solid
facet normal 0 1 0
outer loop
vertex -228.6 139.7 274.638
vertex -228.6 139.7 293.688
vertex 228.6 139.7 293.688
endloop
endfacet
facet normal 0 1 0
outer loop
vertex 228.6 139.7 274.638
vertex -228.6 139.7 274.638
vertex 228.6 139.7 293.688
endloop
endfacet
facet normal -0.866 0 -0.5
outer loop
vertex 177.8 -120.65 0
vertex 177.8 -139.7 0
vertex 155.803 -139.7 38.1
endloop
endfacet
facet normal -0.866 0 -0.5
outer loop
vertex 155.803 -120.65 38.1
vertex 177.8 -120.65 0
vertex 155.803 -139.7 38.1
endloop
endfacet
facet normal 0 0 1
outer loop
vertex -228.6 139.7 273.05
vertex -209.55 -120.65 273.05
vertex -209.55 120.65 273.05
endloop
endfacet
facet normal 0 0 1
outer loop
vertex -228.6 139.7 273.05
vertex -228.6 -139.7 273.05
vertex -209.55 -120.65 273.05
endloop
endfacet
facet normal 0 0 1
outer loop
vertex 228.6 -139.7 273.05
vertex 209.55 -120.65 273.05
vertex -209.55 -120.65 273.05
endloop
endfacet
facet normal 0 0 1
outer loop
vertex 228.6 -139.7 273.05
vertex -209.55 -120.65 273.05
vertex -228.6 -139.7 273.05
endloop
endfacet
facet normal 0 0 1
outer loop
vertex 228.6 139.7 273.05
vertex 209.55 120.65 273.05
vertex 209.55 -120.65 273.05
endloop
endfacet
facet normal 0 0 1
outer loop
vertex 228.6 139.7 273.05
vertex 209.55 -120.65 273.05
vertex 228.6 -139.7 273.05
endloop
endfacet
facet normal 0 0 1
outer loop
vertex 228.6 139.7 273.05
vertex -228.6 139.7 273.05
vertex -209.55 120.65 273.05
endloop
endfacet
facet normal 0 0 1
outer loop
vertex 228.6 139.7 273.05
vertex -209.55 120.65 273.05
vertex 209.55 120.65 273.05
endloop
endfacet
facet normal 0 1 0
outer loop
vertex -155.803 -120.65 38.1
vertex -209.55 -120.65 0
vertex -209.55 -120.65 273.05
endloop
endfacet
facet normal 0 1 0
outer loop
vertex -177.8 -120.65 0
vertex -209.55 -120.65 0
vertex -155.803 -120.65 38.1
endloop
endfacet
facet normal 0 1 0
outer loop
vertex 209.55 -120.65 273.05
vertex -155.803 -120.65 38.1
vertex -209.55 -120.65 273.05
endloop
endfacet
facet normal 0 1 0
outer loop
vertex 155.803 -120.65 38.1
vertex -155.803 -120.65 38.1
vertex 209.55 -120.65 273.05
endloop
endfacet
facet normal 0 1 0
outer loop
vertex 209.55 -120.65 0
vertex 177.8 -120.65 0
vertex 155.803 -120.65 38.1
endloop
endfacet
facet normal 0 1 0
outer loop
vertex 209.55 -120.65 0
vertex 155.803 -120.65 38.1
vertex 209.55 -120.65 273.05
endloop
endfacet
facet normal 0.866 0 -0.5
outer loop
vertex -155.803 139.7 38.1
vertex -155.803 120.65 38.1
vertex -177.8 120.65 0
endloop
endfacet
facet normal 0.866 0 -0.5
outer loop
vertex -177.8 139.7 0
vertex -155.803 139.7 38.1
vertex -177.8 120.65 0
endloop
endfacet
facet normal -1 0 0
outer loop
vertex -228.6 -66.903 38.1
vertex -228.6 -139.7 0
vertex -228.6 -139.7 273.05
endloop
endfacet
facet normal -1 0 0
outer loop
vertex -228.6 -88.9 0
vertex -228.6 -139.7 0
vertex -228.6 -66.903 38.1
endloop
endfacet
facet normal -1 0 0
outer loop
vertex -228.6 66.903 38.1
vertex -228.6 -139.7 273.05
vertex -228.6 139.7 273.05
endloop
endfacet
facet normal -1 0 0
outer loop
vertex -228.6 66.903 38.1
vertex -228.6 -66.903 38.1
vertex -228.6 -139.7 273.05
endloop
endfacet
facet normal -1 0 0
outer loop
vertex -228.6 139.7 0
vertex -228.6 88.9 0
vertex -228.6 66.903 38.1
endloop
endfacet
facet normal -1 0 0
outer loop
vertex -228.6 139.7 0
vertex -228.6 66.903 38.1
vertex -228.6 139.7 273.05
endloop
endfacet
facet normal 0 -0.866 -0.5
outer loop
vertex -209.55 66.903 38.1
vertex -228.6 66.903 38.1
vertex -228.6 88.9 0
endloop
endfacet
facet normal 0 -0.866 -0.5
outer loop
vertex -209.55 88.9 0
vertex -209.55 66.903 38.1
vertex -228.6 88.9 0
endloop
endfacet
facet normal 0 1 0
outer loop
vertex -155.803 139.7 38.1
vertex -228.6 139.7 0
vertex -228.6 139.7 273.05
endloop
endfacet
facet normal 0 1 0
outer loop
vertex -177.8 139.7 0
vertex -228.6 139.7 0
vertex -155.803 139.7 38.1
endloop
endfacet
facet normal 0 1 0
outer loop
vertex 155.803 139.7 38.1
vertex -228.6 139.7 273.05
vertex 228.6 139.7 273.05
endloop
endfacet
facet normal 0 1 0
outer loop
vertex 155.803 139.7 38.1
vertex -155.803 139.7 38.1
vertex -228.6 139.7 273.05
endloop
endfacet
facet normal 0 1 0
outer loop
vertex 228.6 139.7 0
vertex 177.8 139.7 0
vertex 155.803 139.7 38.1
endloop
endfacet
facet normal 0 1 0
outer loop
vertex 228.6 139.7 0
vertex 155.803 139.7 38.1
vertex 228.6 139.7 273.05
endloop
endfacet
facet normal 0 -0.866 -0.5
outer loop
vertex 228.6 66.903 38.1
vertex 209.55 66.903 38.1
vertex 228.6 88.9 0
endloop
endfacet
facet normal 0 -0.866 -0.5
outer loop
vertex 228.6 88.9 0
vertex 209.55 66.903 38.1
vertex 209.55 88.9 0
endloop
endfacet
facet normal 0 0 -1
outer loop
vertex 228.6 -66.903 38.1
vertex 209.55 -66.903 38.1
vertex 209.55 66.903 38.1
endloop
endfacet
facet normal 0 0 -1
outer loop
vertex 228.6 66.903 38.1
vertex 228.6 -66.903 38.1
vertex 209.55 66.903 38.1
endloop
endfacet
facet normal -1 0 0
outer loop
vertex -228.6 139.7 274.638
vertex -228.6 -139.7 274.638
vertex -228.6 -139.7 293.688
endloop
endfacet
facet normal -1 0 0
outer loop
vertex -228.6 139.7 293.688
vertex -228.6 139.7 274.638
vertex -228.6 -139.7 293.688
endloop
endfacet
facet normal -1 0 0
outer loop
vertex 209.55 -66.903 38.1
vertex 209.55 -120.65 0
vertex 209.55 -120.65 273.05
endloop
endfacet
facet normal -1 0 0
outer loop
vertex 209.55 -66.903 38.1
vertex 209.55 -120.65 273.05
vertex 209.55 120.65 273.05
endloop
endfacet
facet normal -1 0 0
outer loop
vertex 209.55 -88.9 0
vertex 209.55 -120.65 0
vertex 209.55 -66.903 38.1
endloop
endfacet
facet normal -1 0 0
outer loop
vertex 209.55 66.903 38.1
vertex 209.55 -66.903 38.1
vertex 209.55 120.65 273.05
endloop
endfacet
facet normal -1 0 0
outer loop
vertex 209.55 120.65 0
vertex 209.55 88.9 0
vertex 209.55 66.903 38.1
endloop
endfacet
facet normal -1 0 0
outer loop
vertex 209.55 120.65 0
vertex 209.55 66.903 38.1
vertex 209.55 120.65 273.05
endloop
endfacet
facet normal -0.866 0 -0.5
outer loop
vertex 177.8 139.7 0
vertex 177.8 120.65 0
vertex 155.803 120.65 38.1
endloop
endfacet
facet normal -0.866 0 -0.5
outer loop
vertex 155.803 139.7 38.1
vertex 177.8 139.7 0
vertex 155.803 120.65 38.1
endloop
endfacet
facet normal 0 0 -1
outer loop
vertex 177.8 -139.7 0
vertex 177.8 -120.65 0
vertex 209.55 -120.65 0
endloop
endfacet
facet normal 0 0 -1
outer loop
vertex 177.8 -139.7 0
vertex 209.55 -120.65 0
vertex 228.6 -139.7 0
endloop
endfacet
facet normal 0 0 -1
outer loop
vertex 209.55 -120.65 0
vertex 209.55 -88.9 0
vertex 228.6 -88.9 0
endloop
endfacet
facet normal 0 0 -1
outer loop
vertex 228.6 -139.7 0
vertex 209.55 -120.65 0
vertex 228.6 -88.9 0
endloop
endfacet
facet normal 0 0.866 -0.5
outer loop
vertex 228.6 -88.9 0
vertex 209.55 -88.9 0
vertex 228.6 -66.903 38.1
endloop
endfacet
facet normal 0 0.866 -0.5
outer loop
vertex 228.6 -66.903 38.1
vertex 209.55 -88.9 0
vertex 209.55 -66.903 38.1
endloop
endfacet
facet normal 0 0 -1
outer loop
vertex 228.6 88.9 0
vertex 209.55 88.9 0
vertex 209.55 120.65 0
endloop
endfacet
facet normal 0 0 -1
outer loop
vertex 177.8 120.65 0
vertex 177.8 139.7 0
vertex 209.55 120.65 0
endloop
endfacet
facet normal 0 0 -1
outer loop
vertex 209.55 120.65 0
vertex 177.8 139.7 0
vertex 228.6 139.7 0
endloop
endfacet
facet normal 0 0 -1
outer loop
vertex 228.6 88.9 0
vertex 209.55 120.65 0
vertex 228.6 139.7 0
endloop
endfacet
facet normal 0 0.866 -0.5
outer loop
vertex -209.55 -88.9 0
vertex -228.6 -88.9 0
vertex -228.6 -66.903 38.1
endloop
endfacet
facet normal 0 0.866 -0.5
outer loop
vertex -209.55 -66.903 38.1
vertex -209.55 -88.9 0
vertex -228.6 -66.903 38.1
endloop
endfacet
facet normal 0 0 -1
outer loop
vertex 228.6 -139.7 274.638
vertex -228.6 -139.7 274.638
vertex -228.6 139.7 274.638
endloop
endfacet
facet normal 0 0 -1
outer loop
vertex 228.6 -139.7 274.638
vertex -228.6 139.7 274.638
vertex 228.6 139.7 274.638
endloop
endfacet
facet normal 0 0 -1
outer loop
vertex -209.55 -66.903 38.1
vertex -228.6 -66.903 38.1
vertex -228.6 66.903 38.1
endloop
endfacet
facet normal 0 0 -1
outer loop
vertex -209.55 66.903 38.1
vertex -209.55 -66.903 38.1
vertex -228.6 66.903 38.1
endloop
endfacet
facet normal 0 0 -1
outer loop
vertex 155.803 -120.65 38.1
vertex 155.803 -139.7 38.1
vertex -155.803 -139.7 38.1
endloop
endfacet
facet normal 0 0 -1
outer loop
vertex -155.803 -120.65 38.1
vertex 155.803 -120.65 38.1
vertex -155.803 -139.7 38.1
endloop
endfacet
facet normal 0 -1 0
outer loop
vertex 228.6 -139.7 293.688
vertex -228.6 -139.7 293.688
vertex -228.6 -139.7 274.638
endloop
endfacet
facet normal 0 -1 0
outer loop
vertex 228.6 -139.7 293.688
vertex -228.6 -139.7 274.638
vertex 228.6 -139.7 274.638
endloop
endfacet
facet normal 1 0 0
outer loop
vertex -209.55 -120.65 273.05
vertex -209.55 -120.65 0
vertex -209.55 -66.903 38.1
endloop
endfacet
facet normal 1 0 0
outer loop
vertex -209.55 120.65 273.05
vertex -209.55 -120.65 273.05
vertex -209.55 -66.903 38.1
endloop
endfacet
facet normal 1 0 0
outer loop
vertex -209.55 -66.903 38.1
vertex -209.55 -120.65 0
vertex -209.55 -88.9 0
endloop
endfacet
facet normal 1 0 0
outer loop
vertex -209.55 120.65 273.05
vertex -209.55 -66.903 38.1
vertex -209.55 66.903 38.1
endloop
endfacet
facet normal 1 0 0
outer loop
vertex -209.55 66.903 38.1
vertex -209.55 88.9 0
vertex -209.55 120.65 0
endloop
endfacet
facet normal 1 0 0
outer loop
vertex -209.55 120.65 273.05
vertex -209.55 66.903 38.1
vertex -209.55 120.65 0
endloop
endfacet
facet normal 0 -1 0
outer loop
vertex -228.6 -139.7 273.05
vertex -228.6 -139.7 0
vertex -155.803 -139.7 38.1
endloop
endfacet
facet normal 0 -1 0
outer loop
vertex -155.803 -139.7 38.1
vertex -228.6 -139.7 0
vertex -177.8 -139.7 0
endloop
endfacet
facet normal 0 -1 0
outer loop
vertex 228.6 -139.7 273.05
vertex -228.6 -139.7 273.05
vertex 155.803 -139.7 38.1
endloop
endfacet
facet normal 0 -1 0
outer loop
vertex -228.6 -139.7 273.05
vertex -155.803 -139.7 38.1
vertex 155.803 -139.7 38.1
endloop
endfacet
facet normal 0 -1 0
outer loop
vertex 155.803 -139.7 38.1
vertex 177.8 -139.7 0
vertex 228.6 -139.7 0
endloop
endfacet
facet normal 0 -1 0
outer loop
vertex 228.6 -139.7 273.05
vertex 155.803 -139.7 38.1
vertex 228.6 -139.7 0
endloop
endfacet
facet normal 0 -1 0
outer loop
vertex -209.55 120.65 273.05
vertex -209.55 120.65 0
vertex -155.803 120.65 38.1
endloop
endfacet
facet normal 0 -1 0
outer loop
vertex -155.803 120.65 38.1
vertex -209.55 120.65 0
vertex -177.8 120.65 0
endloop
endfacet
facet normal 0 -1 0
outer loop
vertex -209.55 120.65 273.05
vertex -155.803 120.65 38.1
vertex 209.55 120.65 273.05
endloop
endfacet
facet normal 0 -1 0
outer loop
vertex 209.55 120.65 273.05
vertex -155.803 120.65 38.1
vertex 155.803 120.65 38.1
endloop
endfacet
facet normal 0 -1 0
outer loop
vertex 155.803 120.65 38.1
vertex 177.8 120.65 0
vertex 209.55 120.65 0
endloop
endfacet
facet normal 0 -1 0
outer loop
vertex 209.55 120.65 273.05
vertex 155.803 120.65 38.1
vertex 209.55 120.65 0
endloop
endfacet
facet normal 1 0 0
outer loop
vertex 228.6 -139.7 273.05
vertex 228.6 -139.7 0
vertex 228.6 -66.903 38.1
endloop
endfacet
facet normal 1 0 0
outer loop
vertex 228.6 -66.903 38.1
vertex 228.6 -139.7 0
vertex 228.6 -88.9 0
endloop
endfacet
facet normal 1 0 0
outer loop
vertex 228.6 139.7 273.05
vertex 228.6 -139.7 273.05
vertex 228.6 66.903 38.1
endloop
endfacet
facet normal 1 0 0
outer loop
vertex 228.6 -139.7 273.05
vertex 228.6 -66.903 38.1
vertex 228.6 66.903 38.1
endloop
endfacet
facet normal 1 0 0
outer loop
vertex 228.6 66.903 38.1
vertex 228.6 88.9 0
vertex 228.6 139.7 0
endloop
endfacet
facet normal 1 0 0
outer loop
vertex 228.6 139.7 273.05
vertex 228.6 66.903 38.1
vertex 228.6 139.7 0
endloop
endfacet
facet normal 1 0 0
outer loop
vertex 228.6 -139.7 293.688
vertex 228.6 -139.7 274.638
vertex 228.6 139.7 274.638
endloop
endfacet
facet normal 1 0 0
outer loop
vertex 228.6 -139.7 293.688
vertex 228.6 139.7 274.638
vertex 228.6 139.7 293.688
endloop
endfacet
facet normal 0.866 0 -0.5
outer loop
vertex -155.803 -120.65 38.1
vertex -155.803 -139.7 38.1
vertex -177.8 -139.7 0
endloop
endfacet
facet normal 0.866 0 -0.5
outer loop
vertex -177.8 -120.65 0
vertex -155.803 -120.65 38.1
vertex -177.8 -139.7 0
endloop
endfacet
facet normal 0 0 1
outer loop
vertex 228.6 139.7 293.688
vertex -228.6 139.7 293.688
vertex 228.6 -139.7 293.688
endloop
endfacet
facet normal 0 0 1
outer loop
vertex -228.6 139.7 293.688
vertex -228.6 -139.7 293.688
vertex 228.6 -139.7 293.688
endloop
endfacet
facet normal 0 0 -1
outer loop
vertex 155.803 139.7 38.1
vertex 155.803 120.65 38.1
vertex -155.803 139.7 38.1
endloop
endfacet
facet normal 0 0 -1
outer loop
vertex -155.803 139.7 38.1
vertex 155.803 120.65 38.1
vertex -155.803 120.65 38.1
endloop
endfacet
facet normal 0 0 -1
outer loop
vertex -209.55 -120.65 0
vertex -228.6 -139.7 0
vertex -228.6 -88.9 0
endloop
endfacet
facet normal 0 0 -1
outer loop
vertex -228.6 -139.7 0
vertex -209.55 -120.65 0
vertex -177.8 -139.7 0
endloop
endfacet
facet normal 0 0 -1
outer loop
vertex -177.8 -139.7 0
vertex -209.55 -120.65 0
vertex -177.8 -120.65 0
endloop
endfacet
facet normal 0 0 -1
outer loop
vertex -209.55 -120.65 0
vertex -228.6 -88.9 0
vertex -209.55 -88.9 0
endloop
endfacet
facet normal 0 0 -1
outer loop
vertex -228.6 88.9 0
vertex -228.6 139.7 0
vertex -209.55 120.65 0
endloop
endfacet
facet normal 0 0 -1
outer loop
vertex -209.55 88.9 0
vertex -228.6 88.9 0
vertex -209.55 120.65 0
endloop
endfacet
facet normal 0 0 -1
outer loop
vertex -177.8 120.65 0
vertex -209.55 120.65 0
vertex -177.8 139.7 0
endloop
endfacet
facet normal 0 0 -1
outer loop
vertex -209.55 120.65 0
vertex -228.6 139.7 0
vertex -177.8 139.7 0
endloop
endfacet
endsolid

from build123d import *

# Parameters (mm, degrees)
F0_W     = 457.2
F0_H     = 279.4
F1_DEPTH = 273.05
F2_T     = -19.05
F4_DEPTH = 279.401
F6_DEPTH = 457.201
F7_W     = 457.2
F7_H     = 19.05
F8_DEPTH = 139.7


with BuildPart() as f1:
    # F0 (on Top) → F1 (new body)
    with BuildSketch(Plane.XY):
        Rectangle(F0_W, F0_H)
    extrude(amount=F1_DEPTH)

    # F2
    f2_openings = [f1.faces().sort_by_distance(p)[0] for p in [
        (0, 0, 273.05),
        (0, 0, 0),
    ]]
    offset(amount=F2_T, openings=f2_openings)

    # F3 (on face) → F4 (cut, through all)
    with BuildSketch(Plane.XZ.offset(139.7)):
        Polygon((-155.802955, 38.1), (-177.8, 0), (177.8, 0), (155.802955, 38.1), align=None)
    extrude(amount=-F4_DEPTH, mode=Mode.SUBTRACT)

    # F5 (on face) → F6 (cut, through all)
    with BuildSketch(Plane(origin=(-228.6, 0, 0), x_dir=(0, -1, 0), z_dir=(-1, 0, 0))):
        Polygon((-88.9, 0), (88.9, 0), (66.902955, 38.1), (-66.902955, 38.1), align=None)
    extrude(amount=-F6_DEPTH, mode=Mode.SUBTRACT)


with BuildPart() as f8:
    # F7 (on Front) → F8 (new body, symmetric)
    with BuildSketch(Plane.XZ):
        with Locations((0, 284.1625)):
            Rectangle(F7_W, F7_H)
    extrude(amount=F8_DEPTH, both=True)


solid = Compound([f1.part, f8.part])
